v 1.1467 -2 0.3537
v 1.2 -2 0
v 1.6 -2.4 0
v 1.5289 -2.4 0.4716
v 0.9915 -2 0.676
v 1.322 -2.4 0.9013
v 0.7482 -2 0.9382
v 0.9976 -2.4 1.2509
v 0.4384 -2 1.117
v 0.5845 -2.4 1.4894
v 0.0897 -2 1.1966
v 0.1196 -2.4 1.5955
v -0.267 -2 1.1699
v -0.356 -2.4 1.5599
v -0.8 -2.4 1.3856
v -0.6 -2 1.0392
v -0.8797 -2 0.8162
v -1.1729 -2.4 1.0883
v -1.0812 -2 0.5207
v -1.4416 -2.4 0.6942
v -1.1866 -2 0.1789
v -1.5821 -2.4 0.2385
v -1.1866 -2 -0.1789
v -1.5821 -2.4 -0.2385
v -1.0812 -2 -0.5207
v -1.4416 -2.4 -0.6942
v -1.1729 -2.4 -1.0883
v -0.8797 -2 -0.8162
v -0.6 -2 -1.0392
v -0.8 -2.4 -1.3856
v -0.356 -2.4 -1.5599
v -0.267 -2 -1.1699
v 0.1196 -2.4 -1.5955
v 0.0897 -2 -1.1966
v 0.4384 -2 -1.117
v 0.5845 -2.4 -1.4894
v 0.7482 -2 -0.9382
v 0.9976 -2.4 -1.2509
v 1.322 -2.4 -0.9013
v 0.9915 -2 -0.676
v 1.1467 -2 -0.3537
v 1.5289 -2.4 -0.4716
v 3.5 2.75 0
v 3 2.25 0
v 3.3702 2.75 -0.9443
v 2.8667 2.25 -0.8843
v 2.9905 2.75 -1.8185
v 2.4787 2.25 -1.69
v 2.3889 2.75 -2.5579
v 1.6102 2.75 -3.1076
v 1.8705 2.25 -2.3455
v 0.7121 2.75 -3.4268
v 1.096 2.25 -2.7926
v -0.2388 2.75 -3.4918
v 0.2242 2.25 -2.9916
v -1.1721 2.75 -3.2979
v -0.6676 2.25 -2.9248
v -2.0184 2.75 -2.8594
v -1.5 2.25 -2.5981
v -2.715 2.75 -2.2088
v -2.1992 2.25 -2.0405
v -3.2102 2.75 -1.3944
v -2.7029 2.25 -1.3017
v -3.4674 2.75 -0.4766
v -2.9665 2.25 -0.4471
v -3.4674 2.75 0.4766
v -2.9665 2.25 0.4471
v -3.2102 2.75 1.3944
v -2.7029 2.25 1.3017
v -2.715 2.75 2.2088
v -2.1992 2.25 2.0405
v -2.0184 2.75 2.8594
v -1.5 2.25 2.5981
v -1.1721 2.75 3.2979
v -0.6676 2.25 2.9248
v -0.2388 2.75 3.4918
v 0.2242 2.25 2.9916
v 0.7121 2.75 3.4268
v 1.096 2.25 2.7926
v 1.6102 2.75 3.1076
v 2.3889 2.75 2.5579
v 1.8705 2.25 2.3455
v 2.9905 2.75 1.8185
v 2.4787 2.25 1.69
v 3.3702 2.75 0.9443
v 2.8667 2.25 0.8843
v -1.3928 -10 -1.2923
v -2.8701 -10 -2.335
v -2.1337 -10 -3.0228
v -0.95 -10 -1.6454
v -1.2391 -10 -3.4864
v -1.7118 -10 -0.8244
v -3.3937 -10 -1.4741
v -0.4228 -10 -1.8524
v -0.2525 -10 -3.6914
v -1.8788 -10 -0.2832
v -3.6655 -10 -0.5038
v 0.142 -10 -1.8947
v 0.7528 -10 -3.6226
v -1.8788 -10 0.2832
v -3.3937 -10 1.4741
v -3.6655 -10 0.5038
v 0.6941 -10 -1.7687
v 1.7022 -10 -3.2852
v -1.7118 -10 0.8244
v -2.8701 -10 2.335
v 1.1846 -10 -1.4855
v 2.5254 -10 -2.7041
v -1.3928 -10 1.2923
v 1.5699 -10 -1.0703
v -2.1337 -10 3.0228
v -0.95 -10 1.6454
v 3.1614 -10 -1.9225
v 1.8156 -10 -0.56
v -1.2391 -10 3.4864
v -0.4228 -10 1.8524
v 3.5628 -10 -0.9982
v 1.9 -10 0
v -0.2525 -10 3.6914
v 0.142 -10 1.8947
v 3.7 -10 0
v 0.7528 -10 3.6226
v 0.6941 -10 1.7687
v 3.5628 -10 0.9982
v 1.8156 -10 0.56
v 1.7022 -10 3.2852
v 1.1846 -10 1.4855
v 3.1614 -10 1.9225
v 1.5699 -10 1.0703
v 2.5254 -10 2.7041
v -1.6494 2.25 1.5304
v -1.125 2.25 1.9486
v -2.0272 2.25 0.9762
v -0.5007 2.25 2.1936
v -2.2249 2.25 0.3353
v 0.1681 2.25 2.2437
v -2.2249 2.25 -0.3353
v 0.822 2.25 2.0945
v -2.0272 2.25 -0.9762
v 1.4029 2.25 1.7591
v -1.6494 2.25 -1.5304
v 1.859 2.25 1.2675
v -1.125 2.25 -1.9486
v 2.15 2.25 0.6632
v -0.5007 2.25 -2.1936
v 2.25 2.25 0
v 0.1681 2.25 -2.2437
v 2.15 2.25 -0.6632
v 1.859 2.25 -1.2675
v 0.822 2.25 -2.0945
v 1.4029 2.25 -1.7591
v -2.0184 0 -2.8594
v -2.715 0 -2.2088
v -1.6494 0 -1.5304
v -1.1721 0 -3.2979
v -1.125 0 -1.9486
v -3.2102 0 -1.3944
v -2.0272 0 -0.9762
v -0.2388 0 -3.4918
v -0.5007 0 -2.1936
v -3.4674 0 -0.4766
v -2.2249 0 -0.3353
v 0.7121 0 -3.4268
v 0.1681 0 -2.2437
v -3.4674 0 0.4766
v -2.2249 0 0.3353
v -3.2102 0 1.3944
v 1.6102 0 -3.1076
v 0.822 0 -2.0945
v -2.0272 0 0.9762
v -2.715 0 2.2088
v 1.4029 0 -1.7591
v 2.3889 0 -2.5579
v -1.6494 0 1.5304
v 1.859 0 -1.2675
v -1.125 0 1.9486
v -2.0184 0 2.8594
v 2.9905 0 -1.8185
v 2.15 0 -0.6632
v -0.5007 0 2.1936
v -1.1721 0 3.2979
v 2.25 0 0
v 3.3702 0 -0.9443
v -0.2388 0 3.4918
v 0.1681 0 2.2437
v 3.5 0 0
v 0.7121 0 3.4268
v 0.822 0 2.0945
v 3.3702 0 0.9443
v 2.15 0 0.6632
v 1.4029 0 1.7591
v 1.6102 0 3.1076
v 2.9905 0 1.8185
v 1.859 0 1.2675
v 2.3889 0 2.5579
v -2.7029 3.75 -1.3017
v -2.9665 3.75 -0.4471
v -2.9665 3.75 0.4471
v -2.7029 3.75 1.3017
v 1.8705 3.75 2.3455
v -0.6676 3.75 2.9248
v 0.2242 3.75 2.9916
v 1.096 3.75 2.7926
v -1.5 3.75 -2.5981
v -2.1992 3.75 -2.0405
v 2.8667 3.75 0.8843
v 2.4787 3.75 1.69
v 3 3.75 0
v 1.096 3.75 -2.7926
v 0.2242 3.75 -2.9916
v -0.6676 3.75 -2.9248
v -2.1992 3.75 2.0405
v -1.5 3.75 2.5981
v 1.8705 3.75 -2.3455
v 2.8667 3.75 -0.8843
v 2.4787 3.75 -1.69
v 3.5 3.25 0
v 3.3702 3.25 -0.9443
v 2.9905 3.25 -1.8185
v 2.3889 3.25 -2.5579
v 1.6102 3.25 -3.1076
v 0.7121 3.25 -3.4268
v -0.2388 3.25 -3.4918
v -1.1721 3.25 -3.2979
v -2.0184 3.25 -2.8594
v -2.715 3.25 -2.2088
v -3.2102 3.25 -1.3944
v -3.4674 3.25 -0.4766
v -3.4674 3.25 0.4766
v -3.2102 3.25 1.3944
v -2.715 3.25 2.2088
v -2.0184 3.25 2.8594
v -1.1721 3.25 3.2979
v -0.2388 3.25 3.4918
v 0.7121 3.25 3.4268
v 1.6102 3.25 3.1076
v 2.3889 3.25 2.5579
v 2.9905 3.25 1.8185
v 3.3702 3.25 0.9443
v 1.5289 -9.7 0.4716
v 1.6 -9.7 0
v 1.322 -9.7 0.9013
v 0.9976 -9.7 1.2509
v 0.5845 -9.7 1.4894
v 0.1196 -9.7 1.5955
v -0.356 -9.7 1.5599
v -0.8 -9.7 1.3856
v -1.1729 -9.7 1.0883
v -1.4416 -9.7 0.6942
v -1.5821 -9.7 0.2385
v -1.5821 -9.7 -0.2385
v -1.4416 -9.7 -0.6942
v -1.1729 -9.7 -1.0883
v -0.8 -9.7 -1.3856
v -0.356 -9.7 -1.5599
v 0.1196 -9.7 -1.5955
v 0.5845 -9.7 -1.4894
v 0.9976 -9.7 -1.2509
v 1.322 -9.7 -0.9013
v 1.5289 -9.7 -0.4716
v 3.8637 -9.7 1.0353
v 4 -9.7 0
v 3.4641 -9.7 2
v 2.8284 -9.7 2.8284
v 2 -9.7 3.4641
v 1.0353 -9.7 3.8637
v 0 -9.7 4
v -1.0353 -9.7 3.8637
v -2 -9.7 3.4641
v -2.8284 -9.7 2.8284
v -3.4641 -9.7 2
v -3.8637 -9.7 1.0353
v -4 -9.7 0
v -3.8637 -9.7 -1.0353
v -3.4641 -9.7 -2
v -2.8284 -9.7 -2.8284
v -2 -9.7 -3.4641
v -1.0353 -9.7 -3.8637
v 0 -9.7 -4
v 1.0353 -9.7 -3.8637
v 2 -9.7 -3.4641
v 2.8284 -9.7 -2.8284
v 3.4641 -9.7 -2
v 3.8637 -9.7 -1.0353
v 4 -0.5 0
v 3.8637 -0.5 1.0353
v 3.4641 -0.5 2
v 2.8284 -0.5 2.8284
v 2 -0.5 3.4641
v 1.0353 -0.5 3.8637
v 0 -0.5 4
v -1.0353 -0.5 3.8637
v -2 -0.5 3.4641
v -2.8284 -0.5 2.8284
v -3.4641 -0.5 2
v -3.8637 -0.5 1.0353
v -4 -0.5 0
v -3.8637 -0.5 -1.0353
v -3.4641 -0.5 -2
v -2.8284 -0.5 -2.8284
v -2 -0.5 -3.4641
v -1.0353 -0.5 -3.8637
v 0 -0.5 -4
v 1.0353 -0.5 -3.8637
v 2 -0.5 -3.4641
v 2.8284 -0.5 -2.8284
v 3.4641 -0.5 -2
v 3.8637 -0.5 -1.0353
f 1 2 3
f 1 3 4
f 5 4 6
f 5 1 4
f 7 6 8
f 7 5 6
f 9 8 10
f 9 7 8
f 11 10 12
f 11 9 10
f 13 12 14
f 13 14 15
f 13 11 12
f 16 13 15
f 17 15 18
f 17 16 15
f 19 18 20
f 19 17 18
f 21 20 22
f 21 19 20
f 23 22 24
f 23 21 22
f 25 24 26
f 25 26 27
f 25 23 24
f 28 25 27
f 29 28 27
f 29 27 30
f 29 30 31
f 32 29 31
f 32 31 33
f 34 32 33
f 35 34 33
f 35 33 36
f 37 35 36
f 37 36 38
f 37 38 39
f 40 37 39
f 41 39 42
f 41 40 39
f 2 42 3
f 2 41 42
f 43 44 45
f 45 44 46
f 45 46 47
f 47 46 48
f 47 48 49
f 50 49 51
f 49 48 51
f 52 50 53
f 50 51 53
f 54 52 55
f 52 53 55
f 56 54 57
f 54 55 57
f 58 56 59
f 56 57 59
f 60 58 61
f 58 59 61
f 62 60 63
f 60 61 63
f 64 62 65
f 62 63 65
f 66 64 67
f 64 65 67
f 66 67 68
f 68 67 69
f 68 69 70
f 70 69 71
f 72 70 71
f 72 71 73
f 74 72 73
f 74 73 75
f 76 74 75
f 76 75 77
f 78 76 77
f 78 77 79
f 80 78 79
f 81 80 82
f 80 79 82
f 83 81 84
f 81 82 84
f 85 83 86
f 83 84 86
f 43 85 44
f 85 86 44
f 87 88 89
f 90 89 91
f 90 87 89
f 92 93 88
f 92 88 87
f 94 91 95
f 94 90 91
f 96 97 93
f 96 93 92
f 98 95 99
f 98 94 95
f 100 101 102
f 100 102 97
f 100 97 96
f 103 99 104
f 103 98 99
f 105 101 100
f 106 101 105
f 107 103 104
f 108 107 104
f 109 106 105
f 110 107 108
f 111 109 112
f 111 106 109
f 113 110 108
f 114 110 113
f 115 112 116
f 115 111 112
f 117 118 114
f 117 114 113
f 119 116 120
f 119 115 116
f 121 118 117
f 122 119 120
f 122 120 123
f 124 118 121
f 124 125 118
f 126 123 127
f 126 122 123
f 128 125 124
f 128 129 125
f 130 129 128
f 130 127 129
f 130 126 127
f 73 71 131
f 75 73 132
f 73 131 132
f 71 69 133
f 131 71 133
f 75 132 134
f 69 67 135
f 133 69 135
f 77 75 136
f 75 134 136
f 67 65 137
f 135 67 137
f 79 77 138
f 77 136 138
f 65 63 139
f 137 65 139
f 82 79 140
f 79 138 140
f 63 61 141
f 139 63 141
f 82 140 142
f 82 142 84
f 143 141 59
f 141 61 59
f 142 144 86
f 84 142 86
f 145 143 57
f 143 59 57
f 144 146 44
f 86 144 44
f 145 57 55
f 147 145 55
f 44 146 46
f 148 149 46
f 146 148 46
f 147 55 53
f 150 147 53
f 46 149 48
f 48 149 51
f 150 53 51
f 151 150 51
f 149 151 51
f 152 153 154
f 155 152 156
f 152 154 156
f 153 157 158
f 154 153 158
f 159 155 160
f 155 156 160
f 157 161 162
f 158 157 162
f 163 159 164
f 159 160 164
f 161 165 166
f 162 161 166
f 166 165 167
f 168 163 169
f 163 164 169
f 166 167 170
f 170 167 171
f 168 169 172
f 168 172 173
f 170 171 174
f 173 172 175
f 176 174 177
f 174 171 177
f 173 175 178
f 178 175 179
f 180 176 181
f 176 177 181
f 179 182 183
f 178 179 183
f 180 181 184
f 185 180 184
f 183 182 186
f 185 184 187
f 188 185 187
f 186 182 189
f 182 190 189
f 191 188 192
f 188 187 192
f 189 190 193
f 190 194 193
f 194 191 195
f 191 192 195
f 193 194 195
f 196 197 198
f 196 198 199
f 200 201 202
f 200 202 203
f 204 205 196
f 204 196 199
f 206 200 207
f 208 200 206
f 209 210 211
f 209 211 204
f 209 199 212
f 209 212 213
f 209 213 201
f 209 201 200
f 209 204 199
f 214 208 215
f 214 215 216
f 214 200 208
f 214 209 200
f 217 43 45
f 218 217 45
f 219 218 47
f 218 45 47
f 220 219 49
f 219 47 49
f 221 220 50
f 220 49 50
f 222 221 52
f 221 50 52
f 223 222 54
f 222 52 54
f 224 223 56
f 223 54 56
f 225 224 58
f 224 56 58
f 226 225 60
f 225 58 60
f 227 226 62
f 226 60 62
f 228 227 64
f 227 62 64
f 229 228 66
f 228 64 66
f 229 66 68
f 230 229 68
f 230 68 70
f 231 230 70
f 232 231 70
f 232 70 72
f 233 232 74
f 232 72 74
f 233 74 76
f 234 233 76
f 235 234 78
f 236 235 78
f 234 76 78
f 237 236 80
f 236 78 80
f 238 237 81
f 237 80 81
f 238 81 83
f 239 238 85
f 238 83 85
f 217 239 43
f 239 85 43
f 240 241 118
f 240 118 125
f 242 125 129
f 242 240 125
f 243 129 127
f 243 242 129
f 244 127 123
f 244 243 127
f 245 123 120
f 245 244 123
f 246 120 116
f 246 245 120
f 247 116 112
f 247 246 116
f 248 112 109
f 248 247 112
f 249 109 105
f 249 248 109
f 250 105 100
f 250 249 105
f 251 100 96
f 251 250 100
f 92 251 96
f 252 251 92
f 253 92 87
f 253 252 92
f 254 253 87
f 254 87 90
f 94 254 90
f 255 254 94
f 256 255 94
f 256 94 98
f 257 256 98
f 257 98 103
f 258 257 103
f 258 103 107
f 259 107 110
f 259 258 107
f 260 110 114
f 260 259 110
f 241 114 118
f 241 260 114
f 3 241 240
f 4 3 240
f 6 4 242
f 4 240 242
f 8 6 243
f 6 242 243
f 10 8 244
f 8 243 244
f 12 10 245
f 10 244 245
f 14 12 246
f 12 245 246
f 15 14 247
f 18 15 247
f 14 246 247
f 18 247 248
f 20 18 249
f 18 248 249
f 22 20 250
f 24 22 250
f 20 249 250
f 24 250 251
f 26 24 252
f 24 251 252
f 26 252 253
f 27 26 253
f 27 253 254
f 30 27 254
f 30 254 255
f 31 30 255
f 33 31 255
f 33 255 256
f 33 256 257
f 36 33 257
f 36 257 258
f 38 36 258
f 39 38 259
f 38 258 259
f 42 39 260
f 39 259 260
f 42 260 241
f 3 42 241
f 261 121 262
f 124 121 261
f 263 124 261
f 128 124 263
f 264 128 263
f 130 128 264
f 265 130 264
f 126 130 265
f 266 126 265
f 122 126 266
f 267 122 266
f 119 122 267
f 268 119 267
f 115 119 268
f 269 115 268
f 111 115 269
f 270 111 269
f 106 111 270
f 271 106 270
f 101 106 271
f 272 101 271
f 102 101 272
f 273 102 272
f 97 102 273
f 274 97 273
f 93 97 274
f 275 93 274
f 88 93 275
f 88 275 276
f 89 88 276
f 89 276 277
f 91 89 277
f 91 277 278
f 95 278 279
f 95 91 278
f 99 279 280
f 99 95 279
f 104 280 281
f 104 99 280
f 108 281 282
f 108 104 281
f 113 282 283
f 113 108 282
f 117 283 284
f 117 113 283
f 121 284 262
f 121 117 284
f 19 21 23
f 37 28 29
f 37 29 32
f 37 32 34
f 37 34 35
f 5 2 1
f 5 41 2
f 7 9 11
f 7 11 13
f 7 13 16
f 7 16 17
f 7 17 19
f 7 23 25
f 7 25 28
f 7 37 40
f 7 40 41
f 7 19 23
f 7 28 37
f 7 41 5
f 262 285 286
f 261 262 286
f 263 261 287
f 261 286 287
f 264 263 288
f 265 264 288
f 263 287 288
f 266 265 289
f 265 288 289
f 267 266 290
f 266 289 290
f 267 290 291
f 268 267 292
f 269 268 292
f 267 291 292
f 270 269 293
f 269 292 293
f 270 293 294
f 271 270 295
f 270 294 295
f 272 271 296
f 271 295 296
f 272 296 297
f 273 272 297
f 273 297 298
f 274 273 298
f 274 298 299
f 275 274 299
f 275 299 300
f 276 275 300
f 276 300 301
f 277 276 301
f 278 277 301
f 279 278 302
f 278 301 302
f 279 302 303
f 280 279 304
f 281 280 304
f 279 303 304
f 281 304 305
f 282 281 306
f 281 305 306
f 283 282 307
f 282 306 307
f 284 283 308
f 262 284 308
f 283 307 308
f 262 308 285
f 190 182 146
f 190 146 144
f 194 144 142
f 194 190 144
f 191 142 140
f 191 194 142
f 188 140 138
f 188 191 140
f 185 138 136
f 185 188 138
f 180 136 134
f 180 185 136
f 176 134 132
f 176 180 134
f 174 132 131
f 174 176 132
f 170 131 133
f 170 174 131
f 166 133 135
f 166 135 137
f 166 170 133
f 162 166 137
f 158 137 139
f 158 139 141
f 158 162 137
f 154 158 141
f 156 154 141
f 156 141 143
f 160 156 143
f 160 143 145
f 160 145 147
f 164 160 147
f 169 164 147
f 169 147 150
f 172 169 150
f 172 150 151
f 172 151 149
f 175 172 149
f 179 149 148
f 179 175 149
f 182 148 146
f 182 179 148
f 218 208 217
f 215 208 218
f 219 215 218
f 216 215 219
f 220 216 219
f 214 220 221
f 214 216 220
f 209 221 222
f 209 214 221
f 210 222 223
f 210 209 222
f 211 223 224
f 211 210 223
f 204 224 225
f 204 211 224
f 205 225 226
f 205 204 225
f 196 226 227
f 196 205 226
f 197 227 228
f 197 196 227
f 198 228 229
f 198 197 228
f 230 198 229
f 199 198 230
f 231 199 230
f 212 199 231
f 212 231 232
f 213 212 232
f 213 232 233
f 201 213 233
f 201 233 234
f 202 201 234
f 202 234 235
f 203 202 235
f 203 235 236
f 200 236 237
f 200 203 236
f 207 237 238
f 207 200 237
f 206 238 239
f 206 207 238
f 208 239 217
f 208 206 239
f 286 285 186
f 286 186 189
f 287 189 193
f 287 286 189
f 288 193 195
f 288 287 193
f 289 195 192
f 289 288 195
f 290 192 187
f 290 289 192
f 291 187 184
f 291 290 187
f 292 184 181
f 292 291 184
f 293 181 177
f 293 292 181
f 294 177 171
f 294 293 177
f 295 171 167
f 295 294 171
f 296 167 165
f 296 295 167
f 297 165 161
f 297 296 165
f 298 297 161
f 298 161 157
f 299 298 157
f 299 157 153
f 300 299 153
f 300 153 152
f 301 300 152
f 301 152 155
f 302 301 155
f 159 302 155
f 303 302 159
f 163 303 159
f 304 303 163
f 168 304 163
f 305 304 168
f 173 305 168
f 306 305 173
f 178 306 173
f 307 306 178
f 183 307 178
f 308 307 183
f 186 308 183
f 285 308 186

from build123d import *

# Parameters (mm, degrees)
SKETCH_R        = 4
PAD_DEPTH       = 10
SKETCH001_R     = 2.25
PAD001_DEPTH    = 2.25
SKETCH002_R     = 3.5
PAD002_DEPTH    = 1.5
CHAMFER_SIZE    = 0.5
SKETCH003_R     = 1.6
POCKET_DEPTH    = 8
CHAMFER001_SIZE = 0.3
CHAMFER002_SIZE = 0.4


with BuildPart() as part:
    # Sketch → Pad (new body)
    with BuildSketch(Plane.XZ):
        Circle(SKETCH_R)
    extrude(amount=PAD_DEPTH)

    # Sketch001 → Pad001 (join)
    with BuildSketch(Plane.XZ):
        Circle(SKETCH001_R)
    extrude(amount=-PAD001_DEPTH)

    # Sketch002 (on Face5 of Pad001) → Pad002 (join)
    with BuildSketch(Plane(origin=(0, 2.25, 0), x_dir=(1, 0, 0), z_dir=(0, 1, 0))):
        Circle(SKETCH002_R)
    extrude(amount=PAD002_DEPTH)

    # Chamfer
    chamfer_edges = [part.edges().sort_by_distance(p)[0] for p in [
        (-3.5, 3.75, 0),
        (-3.5, 2.25, 0),
        (-4, 0, 0),
    ]]
    chamfer(chamfer_edges, length=CHAMFER_SIZE)

    # Sketch003 (on Face3 of Chamfer) → Pocket (cut)
    with BuildSketch(Plane.XZ.offset(10)):
        Circle(SKETCH003_R)
    extrude(amount=-POCKET_DEPTH, mode=Mode.SUBTRACT)

    # Chamfer001
    chamfer001_edges = [part.edges().sort_by_distance(p)[0] for p in [
        (-4, -10, 0),
        (-1.6, -10, 0),
    ]]
    chamfer(chamfer001_edges, length=CHAMFER001_SIZE)

    # Chamfer002
    chamfer002_edges = [part.edges().sort_by_distance(p)[0] for p in [
        (-1.6, -2, 0),
    ]]
    chamfer(chamfer002_edges, length=CHAMFER002_SIZE)


solid = part.part
